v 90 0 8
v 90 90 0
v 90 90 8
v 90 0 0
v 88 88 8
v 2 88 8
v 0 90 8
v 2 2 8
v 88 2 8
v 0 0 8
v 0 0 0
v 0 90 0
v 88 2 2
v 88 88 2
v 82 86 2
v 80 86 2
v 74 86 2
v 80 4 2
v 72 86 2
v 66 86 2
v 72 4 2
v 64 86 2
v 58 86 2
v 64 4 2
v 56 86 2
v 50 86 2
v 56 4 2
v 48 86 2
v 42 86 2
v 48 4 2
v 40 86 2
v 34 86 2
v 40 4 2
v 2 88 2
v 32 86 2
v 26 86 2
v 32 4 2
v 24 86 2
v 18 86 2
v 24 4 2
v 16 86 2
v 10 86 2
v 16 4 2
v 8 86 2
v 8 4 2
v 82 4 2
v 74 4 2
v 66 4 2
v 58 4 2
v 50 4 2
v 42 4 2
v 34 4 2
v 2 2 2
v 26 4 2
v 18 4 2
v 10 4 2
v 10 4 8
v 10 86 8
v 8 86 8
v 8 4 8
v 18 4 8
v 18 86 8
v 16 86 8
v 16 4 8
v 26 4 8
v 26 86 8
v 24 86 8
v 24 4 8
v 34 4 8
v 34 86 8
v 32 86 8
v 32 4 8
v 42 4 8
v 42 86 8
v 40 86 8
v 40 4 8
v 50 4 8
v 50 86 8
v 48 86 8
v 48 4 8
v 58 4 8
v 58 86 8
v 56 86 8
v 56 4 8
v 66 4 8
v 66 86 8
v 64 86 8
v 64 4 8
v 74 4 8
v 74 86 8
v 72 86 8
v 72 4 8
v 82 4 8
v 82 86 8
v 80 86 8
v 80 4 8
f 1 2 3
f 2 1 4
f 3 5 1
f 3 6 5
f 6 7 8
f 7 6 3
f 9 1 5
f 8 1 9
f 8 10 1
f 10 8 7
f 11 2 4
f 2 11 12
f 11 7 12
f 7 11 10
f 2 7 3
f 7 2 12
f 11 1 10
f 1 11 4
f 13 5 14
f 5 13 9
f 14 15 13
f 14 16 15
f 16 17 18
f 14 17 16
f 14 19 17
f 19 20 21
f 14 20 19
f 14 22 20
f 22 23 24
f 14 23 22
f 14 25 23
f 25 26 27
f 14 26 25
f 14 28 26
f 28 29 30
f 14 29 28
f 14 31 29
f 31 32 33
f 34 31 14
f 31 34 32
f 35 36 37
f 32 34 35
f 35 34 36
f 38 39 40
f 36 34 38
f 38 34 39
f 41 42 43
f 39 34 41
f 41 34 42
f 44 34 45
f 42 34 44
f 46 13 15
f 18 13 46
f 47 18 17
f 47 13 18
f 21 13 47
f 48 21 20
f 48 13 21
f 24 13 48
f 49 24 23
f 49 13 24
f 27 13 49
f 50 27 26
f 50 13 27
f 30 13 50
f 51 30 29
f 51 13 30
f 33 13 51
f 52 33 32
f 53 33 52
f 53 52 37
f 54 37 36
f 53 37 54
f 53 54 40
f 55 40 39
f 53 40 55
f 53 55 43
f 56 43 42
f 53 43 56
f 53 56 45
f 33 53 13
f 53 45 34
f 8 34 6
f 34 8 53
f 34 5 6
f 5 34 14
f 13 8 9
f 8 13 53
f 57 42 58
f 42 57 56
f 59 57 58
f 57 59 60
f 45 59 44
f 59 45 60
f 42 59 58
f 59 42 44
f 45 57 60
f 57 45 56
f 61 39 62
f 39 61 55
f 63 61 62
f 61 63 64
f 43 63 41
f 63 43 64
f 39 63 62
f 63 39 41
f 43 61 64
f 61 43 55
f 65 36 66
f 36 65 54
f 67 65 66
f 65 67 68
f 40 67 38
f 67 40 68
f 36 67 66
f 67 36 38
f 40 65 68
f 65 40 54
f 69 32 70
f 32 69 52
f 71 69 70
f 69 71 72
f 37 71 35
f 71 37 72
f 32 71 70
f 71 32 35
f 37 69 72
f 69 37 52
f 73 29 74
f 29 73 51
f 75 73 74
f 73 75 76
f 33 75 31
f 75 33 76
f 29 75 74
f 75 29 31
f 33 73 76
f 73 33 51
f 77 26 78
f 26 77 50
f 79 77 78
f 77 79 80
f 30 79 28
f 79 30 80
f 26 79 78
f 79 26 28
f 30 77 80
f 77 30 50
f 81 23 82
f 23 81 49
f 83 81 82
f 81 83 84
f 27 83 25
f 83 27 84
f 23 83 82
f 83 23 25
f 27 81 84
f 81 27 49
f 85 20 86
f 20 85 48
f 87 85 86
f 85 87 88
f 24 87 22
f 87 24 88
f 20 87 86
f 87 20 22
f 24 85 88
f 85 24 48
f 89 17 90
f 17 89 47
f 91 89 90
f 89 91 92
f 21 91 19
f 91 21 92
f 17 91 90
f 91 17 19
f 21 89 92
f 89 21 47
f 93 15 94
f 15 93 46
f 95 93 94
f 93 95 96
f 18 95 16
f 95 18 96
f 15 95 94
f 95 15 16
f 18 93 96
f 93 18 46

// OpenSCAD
// this is the x/y size of the tray
width = 90;
// how deep the tray is
depth = 8;
//how far apart the "fins" should be
spacing = 6;
// how thick the walls/floor should be
wall_width = 2;
module plantTray(){
    difference() {
        cube([width,width,depth]);
        translate([wall_width,wall_width,wall_width])
            cube([width-2*wall_width,width-2*wall_width,depth]);
    }
    for (i = [1:(width-2*wall_width)/(spacing+wall_width)]) {
        translate([i * (spacing+wall_width), 2*wall_width, 0]) 
            cube([wall_width, width-4*wall_width,depth]);
    }
}
plantTray();
